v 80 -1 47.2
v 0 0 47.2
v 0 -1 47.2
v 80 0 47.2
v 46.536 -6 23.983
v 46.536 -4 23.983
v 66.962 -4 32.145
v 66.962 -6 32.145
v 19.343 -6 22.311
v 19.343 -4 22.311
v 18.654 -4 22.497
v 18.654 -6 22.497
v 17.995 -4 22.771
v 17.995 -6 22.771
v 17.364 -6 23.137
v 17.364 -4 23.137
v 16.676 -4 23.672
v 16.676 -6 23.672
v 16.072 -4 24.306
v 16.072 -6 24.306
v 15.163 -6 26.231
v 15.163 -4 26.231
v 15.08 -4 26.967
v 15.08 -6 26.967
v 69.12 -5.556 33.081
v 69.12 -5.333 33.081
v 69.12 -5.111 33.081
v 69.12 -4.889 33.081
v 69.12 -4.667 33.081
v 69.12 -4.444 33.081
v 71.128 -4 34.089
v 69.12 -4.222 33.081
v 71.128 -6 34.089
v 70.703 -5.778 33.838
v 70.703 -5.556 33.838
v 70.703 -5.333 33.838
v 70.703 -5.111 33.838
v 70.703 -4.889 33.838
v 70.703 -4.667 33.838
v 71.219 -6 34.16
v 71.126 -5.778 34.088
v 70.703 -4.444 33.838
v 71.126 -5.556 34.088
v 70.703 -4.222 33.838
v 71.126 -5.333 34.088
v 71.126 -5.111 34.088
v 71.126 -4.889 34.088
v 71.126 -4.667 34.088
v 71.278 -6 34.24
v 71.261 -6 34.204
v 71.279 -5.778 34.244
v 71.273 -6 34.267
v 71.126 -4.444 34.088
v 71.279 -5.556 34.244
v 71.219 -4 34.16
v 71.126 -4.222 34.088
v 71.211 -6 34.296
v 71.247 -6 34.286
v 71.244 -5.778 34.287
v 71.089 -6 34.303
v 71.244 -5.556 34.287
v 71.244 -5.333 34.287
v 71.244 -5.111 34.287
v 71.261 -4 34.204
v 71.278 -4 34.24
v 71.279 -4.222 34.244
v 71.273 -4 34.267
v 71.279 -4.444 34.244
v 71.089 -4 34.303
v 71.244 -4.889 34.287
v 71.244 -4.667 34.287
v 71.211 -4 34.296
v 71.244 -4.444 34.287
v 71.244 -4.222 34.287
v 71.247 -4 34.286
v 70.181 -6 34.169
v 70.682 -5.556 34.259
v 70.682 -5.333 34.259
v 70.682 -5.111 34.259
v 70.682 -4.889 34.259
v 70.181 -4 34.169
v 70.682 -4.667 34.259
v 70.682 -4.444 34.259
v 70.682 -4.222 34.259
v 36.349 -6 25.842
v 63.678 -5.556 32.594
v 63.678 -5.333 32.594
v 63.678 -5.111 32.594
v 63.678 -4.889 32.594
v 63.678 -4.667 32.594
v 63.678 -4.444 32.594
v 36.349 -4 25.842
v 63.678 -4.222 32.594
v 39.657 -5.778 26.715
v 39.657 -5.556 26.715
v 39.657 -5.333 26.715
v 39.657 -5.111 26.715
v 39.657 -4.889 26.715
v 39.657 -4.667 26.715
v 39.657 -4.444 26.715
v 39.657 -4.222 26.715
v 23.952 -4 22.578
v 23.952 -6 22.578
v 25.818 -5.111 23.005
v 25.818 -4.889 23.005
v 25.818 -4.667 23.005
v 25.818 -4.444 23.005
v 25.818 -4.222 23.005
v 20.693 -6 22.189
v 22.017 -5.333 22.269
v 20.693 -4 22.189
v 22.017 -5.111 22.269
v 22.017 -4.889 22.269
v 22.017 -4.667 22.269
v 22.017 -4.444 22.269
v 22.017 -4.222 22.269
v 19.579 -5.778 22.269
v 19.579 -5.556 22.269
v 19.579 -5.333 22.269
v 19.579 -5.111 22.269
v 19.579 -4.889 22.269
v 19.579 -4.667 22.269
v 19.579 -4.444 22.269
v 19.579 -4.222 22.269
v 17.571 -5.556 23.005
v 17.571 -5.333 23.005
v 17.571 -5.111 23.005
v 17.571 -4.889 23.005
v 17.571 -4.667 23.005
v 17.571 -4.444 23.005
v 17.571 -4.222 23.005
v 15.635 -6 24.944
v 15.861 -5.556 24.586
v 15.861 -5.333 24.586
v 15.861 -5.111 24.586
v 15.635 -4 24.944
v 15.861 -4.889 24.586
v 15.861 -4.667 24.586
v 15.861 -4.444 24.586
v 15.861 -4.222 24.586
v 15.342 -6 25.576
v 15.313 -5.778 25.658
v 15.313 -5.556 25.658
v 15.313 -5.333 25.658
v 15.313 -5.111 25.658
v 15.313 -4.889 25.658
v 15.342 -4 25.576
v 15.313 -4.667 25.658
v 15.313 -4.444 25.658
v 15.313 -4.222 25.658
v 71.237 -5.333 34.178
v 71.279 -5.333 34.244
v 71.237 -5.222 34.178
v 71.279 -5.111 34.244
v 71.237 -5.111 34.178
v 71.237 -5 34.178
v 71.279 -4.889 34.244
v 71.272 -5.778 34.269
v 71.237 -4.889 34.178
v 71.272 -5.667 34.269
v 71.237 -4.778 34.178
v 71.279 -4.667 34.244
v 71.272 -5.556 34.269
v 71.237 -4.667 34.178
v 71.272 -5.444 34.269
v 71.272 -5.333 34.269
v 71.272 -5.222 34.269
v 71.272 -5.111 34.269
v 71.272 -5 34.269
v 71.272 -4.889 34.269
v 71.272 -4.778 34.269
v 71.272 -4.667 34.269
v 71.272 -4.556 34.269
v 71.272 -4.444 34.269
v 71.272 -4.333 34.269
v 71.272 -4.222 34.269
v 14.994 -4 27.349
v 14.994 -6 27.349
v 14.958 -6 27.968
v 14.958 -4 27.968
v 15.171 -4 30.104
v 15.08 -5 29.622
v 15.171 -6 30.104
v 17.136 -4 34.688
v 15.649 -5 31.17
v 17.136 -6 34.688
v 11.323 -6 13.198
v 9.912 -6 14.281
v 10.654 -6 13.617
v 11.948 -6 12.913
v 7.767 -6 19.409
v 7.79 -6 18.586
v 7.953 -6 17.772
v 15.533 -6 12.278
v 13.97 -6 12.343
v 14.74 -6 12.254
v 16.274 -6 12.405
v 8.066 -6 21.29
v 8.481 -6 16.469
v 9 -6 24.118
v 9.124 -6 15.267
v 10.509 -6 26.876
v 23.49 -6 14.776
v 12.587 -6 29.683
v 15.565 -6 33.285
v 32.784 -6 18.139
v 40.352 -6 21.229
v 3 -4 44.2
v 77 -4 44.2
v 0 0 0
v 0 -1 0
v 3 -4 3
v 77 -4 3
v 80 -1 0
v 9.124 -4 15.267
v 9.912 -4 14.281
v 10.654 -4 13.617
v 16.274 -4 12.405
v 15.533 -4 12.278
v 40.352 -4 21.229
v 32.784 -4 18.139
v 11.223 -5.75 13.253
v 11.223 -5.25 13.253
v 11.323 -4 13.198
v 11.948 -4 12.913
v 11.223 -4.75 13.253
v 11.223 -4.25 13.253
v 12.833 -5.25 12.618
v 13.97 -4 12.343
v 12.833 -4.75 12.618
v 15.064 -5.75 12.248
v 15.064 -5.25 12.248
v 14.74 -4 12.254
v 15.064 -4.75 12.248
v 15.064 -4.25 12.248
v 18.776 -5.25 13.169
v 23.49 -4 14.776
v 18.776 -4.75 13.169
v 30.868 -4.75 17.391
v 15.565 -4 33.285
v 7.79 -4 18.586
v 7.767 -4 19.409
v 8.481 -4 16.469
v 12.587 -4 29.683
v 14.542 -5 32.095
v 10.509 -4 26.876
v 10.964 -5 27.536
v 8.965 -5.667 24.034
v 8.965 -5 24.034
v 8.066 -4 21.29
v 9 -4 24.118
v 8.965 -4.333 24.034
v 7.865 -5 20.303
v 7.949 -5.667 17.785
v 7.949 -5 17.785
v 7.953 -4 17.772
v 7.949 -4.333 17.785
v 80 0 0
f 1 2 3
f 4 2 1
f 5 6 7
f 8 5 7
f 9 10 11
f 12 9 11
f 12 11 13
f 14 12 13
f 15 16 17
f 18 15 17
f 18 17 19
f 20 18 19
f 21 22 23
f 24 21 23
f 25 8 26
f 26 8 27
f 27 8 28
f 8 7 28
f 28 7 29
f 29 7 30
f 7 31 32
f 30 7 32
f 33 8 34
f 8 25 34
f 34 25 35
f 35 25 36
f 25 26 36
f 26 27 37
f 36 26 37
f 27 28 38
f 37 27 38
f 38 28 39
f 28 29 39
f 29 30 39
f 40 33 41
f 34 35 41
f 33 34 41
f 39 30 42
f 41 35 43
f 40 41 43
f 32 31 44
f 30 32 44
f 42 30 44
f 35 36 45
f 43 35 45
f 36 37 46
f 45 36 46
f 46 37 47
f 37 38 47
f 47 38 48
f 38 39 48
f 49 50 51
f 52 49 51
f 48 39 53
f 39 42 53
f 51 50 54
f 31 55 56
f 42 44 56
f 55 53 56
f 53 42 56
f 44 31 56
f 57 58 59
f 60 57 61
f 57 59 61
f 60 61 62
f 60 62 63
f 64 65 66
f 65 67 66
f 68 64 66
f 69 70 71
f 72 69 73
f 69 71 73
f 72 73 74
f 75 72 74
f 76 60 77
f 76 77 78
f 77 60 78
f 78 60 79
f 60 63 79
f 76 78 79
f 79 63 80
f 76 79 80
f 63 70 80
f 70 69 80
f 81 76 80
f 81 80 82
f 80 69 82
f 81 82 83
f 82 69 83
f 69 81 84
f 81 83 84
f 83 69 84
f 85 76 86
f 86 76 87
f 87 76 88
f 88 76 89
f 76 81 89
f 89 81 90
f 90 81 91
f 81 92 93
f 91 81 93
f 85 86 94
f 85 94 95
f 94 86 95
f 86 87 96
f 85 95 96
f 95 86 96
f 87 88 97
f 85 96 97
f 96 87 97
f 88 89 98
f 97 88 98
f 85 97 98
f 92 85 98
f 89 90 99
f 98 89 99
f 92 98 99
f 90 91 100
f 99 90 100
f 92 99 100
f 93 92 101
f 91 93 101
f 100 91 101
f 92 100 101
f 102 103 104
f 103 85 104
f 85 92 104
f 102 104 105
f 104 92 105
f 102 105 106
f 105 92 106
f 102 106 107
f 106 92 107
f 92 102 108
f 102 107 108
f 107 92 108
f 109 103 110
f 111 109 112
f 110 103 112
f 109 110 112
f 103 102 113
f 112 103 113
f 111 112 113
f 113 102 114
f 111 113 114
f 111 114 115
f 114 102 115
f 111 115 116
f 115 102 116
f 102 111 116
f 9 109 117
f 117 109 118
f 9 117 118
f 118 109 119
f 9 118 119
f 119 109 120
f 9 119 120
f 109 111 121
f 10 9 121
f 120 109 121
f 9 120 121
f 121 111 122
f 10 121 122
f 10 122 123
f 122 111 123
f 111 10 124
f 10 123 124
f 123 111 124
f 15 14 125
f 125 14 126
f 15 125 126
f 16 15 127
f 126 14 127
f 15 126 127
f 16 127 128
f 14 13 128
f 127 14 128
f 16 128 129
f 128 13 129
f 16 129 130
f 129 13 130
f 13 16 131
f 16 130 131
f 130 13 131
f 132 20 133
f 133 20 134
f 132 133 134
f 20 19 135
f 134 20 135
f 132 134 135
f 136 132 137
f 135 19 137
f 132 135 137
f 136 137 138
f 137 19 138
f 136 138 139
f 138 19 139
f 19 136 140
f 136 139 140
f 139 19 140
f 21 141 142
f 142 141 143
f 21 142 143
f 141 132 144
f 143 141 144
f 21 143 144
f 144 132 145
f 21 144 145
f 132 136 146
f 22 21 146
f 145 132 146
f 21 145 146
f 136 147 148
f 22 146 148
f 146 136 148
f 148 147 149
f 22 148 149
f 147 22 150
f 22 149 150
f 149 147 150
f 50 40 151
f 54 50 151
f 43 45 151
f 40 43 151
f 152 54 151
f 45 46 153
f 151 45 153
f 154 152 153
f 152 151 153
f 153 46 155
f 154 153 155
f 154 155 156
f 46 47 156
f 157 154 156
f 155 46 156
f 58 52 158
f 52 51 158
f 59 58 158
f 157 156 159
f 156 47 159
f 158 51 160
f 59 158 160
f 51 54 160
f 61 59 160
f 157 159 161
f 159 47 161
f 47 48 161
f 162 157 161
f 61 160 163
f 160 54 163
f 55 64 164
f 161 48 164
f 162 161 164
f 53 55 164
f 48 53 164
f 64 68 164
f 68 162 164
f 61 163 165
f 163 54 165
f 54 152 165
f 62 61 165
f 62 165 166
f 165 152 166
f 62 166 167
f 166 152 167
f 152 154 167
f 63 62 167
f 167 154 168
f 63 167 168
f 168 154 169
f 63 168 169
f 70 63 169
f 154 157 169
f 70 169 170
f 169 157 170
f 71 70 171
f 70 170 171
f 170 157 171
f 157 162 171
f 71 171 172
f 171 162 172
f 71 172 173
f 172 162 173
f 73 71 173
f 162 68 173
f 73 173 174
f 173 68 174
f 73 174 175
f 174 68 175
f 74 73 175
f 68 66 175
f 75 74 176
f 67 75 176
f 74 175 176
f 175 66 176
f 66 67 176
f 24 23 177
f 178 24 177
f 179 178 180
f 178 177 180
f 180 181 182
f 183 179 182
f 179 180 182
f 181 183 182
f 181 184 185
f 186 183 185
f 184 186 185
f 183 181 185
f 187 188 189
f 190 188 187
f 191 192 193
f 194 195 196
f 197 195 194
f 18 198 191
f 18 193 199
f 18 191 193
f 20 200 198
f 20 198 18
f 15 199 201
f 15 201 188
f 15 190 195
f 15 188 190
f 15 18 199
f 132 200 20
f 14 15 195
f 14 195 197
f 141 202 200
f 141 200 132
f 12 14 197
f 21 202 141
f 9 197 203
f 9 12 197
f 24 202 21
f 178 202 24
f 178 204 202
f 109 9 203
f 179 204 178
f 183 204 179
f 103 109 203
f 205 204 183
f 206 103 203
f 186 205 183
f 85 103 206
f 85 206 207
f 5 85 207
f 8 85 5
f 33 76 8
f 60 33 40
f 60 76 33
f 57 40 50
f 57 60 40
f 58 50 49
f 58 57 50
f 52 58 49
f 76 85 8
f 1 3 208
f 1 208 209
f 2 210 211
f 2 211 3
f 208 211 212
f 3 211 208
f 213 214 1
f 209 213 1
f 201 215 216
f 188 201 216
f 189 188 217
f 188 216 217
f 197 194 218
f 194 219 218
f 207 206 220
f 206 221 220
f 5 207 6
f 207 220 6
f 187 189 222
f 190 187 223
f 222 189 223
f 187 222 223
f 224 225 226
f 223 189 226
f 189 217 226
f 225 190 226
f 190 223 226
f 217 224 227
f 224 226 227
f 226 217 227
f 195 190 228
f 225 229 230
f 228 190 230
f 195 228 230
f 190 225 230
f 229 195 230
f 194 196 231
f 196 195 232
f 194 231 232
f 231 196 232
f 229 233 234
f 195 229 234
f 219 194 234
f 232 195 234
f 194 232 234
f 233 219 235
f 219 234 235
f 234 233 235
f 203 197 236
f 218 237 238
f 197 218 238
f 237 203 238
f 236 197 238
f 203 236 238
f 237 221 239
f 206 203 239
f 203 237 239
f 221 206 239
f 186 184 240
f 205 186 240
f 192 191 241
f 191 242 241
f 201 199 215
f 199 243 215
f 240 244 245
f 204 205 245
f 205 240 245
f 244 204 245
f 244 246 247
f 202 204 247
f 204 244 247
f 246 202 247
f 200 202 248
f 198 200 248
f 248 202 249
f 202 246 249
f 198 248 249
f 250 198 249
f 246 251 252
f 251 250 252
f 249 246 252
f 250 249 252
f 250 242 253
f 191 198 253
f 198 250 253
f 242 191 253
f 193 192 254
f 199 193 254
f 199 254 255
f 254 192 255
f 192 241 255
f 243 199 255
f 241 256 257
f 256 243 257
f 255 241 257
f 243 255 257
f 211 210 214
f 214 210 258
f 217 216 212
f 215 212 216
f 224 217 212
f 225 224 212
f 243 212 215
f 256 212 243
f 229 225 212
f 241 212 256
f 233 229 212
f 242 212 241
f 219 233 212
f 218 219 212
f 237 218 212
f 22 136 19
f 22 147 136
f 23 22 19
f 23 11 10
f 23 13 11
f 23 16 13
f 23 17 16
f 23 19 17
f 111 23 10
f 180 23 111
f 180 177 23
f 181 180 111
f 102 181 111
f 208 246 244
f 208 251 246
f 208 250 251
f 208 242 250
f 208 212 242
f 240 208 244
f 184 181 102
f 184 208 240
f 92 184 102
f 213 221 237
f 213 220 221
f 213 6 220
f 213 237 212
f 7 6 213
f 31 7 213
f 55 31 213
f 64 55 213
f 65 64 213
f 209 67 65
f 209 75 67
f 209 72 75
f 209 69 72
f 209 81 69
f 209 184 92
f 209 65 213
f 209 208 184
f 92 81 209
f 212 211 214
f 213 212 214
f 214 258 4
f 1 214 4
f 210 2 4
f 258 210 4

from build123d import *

# Parameters (mm, degrees)
F0_W     = 80
F0_H     = 47.2
F1_DEPTH = 4
F2_DEPTH = 6
F3_SIZE  = 3


with BuildPart() as f1:
    # F0 (on Front) → F1 (new body)
    with BuildSketch(Plane.XZ):
        with Locations((40, 23.6)):
            Rectangle(F0_W, F0_H)
        with BuildLine():
            add(Edge.make_bspline(
                [(17.1363148838, 34.6875376999), (15.9709714115, 33.813533296), (14.6454076172, 32.2361525539), (10.8054794007, 27.5349979334), (8.8814864432, 24.2395643572), (7.7208840141, 20.337695709), (7.7068437804, 17.7983637424), (8.7168352507, 15.9980168361), (9.1244392097, 15.267027542)],
                knots=[0, 0, 0, 0, 0.1657058096, 0.3740097389, 0.5477834709, 0.7184266397, 0.8557661666, 1, 1, 1, 1], degree=3))
            add(Edge.make_bspline(
                [(15.0800812989, 26.9671771675), (14.8434402907, 27.6429571585), (15.249879851, 31.0417693735), (15.0800812989, 29.6218451113), (17.1363148838, 34.6875376999)],
                knots=[0, 0, 0, 0, 0.410665319, 1, 1, 1, 1], degree=3))
            add(Edge.make_bspline(
                [(46.5358011425, 23.9828266203), (58.8610870399, 28.8220409737), (77.8743960363, 36.2880986902), (61.4713754953, 31.9454210046), (40.349209885, 27.100503176), (26.3522324836, 23.0275354439), (22.2033889542, 22.2112571048), (19.5731772361, 22.1226822304), (17.5042470378, 22.8769475905), (15.669613301, 24.5211589613), (15.1214094982, 25.9935981564), (15.0800812989, 26.9671771675)],
                knots=[0, 0, 0, 0, 0.2084981148, 0.3208473341, 0.5211847938, 0.673672188, 0.752933241, 0.8158348084, 0.8747460304, 0.9362283877, 1, 1, 1, 1], degree=3))
            add(Edge.make_bspline(
                [(9.1244392097, 15.267027542), (9.8846950199, 14.168879844), (11.0754057506, 13.1999786552), (12.828750462, 12.5843103062), (15.2765601562, 11.9936947768), (18.7775524844, 13.1604719137), (27.6036856538, 16.179956986), (30.6936505315, 17.2942993327), (40.123596938, 21.0488710633), (44.3796571006, 23.0051061568), (46.5358011425, 23.9828266203)],
                knots=[0, 0, 0, 0, 0.0988889906, 0.1751702122, 0.2623644396, 0.3757677658, 0.5501487398, 0.6626437638, 0.8425100104, 1, 1, 1, 1], degree=3))
        make_face(mode=Mode.SUBTRACT)
    extrude(amount=F1_DEPTH)

    # F0 (on Front) → F2 (join)
    with BuildSketch(Plane.XZ):
        with BuildLine():
            add(Edge.make_bspline(
                [(15.0800812989, 26.9671771675), (14.8434402907, 27.6429571585), (15.249879851, 31.0417693735), (15.0800812989, 29.6218451113), (17.1363148838, 34.6875376999)],
                knots=[0, 0, 0, 0, 0.410665319, 1, 1, 1, 1], degree=3))
            add(Edge.make_bspline(
                [(17.1363148838, 34.6875376999), (15.9709714115, 33.813533296), (14.6454076172, 32.2361525539), (10.8054794007, 27.5349979334), (8.8814864432, 24.2395643572), (7.7208840141, 20.337695709), (7.7068437804, 17.7983637424), (8.7168352507, 15.9980168361), (9.1244392097, 15.267027542)],
                knots=[0, 0, 0, 0, 0.1657058096, 0.3740097389, 0.5477834709, 0.7184266397, 0.8557661666, 1, 1, 1, 1], degree=3))
            add(Edge.make_bspline(
                [(9.1244392097, 15.267027542), (9.8846950199, 14.168879844), (11.0754057506, 13.1999786552), (12.828750462, 12.5843103062), (15.2765601562, 11.9936947768), (18.7775524844, 13.1604719137), (27.6036856538, 16.179956986), (30.6936505315, 17.2942993327), (40.123596938, 21.0488710633), (44.3796571006, 23.0051061568), (46.5358011425, 23.9828266203)],
                knots=[0, 0, 0, 0, 0.0988889906, 0.1751702122, 0.2623644396, 0.3757677658, 0.5501487398, 0.6626437638, 0.8425100104, 1, 1, 1, 1], degree=3))
            add(Edge.make_bspline(
                [(46.5358011425, 23.9828266203), (58.8610870399, 28.8220409737), (77.8743960363, 36.2880986902), (61.4713754953, 31.9454210046), (40.349209885, 27.100503176), (26.3522324836, 23.0275354439), (22.2033889542, 22.2112571048), (19.5731772361, 22.1226822304), (17.5042470378, 22.8769475905), (15.669613301, 24.5211589613), (15.1214094982, 25.9935981564), (15.0800812989, 26.9671771675)],
                knots=[0, 0, 0, 0, 0.2084981148, 0.3208473341, 0.5211847938, 0.673672188, 0.752933241, 0.8158348084, 0.8747460304, 0.9362283877, 1, 1, 1, 1], degree=3))
        make_face()
    extrude(amount=F2_DEPTH)

    # F3
    f3_edges = [f1.edges().sort_by_distance(p)[0] for p in [
        (0, -4, 23.6),
        (40, -4, 0),
        (80, -4, 23.6),
        (40, -4, 47.2),
    ]]
    chamfer(f3_edges, length=F3_SIZE)


solid = f1.part
